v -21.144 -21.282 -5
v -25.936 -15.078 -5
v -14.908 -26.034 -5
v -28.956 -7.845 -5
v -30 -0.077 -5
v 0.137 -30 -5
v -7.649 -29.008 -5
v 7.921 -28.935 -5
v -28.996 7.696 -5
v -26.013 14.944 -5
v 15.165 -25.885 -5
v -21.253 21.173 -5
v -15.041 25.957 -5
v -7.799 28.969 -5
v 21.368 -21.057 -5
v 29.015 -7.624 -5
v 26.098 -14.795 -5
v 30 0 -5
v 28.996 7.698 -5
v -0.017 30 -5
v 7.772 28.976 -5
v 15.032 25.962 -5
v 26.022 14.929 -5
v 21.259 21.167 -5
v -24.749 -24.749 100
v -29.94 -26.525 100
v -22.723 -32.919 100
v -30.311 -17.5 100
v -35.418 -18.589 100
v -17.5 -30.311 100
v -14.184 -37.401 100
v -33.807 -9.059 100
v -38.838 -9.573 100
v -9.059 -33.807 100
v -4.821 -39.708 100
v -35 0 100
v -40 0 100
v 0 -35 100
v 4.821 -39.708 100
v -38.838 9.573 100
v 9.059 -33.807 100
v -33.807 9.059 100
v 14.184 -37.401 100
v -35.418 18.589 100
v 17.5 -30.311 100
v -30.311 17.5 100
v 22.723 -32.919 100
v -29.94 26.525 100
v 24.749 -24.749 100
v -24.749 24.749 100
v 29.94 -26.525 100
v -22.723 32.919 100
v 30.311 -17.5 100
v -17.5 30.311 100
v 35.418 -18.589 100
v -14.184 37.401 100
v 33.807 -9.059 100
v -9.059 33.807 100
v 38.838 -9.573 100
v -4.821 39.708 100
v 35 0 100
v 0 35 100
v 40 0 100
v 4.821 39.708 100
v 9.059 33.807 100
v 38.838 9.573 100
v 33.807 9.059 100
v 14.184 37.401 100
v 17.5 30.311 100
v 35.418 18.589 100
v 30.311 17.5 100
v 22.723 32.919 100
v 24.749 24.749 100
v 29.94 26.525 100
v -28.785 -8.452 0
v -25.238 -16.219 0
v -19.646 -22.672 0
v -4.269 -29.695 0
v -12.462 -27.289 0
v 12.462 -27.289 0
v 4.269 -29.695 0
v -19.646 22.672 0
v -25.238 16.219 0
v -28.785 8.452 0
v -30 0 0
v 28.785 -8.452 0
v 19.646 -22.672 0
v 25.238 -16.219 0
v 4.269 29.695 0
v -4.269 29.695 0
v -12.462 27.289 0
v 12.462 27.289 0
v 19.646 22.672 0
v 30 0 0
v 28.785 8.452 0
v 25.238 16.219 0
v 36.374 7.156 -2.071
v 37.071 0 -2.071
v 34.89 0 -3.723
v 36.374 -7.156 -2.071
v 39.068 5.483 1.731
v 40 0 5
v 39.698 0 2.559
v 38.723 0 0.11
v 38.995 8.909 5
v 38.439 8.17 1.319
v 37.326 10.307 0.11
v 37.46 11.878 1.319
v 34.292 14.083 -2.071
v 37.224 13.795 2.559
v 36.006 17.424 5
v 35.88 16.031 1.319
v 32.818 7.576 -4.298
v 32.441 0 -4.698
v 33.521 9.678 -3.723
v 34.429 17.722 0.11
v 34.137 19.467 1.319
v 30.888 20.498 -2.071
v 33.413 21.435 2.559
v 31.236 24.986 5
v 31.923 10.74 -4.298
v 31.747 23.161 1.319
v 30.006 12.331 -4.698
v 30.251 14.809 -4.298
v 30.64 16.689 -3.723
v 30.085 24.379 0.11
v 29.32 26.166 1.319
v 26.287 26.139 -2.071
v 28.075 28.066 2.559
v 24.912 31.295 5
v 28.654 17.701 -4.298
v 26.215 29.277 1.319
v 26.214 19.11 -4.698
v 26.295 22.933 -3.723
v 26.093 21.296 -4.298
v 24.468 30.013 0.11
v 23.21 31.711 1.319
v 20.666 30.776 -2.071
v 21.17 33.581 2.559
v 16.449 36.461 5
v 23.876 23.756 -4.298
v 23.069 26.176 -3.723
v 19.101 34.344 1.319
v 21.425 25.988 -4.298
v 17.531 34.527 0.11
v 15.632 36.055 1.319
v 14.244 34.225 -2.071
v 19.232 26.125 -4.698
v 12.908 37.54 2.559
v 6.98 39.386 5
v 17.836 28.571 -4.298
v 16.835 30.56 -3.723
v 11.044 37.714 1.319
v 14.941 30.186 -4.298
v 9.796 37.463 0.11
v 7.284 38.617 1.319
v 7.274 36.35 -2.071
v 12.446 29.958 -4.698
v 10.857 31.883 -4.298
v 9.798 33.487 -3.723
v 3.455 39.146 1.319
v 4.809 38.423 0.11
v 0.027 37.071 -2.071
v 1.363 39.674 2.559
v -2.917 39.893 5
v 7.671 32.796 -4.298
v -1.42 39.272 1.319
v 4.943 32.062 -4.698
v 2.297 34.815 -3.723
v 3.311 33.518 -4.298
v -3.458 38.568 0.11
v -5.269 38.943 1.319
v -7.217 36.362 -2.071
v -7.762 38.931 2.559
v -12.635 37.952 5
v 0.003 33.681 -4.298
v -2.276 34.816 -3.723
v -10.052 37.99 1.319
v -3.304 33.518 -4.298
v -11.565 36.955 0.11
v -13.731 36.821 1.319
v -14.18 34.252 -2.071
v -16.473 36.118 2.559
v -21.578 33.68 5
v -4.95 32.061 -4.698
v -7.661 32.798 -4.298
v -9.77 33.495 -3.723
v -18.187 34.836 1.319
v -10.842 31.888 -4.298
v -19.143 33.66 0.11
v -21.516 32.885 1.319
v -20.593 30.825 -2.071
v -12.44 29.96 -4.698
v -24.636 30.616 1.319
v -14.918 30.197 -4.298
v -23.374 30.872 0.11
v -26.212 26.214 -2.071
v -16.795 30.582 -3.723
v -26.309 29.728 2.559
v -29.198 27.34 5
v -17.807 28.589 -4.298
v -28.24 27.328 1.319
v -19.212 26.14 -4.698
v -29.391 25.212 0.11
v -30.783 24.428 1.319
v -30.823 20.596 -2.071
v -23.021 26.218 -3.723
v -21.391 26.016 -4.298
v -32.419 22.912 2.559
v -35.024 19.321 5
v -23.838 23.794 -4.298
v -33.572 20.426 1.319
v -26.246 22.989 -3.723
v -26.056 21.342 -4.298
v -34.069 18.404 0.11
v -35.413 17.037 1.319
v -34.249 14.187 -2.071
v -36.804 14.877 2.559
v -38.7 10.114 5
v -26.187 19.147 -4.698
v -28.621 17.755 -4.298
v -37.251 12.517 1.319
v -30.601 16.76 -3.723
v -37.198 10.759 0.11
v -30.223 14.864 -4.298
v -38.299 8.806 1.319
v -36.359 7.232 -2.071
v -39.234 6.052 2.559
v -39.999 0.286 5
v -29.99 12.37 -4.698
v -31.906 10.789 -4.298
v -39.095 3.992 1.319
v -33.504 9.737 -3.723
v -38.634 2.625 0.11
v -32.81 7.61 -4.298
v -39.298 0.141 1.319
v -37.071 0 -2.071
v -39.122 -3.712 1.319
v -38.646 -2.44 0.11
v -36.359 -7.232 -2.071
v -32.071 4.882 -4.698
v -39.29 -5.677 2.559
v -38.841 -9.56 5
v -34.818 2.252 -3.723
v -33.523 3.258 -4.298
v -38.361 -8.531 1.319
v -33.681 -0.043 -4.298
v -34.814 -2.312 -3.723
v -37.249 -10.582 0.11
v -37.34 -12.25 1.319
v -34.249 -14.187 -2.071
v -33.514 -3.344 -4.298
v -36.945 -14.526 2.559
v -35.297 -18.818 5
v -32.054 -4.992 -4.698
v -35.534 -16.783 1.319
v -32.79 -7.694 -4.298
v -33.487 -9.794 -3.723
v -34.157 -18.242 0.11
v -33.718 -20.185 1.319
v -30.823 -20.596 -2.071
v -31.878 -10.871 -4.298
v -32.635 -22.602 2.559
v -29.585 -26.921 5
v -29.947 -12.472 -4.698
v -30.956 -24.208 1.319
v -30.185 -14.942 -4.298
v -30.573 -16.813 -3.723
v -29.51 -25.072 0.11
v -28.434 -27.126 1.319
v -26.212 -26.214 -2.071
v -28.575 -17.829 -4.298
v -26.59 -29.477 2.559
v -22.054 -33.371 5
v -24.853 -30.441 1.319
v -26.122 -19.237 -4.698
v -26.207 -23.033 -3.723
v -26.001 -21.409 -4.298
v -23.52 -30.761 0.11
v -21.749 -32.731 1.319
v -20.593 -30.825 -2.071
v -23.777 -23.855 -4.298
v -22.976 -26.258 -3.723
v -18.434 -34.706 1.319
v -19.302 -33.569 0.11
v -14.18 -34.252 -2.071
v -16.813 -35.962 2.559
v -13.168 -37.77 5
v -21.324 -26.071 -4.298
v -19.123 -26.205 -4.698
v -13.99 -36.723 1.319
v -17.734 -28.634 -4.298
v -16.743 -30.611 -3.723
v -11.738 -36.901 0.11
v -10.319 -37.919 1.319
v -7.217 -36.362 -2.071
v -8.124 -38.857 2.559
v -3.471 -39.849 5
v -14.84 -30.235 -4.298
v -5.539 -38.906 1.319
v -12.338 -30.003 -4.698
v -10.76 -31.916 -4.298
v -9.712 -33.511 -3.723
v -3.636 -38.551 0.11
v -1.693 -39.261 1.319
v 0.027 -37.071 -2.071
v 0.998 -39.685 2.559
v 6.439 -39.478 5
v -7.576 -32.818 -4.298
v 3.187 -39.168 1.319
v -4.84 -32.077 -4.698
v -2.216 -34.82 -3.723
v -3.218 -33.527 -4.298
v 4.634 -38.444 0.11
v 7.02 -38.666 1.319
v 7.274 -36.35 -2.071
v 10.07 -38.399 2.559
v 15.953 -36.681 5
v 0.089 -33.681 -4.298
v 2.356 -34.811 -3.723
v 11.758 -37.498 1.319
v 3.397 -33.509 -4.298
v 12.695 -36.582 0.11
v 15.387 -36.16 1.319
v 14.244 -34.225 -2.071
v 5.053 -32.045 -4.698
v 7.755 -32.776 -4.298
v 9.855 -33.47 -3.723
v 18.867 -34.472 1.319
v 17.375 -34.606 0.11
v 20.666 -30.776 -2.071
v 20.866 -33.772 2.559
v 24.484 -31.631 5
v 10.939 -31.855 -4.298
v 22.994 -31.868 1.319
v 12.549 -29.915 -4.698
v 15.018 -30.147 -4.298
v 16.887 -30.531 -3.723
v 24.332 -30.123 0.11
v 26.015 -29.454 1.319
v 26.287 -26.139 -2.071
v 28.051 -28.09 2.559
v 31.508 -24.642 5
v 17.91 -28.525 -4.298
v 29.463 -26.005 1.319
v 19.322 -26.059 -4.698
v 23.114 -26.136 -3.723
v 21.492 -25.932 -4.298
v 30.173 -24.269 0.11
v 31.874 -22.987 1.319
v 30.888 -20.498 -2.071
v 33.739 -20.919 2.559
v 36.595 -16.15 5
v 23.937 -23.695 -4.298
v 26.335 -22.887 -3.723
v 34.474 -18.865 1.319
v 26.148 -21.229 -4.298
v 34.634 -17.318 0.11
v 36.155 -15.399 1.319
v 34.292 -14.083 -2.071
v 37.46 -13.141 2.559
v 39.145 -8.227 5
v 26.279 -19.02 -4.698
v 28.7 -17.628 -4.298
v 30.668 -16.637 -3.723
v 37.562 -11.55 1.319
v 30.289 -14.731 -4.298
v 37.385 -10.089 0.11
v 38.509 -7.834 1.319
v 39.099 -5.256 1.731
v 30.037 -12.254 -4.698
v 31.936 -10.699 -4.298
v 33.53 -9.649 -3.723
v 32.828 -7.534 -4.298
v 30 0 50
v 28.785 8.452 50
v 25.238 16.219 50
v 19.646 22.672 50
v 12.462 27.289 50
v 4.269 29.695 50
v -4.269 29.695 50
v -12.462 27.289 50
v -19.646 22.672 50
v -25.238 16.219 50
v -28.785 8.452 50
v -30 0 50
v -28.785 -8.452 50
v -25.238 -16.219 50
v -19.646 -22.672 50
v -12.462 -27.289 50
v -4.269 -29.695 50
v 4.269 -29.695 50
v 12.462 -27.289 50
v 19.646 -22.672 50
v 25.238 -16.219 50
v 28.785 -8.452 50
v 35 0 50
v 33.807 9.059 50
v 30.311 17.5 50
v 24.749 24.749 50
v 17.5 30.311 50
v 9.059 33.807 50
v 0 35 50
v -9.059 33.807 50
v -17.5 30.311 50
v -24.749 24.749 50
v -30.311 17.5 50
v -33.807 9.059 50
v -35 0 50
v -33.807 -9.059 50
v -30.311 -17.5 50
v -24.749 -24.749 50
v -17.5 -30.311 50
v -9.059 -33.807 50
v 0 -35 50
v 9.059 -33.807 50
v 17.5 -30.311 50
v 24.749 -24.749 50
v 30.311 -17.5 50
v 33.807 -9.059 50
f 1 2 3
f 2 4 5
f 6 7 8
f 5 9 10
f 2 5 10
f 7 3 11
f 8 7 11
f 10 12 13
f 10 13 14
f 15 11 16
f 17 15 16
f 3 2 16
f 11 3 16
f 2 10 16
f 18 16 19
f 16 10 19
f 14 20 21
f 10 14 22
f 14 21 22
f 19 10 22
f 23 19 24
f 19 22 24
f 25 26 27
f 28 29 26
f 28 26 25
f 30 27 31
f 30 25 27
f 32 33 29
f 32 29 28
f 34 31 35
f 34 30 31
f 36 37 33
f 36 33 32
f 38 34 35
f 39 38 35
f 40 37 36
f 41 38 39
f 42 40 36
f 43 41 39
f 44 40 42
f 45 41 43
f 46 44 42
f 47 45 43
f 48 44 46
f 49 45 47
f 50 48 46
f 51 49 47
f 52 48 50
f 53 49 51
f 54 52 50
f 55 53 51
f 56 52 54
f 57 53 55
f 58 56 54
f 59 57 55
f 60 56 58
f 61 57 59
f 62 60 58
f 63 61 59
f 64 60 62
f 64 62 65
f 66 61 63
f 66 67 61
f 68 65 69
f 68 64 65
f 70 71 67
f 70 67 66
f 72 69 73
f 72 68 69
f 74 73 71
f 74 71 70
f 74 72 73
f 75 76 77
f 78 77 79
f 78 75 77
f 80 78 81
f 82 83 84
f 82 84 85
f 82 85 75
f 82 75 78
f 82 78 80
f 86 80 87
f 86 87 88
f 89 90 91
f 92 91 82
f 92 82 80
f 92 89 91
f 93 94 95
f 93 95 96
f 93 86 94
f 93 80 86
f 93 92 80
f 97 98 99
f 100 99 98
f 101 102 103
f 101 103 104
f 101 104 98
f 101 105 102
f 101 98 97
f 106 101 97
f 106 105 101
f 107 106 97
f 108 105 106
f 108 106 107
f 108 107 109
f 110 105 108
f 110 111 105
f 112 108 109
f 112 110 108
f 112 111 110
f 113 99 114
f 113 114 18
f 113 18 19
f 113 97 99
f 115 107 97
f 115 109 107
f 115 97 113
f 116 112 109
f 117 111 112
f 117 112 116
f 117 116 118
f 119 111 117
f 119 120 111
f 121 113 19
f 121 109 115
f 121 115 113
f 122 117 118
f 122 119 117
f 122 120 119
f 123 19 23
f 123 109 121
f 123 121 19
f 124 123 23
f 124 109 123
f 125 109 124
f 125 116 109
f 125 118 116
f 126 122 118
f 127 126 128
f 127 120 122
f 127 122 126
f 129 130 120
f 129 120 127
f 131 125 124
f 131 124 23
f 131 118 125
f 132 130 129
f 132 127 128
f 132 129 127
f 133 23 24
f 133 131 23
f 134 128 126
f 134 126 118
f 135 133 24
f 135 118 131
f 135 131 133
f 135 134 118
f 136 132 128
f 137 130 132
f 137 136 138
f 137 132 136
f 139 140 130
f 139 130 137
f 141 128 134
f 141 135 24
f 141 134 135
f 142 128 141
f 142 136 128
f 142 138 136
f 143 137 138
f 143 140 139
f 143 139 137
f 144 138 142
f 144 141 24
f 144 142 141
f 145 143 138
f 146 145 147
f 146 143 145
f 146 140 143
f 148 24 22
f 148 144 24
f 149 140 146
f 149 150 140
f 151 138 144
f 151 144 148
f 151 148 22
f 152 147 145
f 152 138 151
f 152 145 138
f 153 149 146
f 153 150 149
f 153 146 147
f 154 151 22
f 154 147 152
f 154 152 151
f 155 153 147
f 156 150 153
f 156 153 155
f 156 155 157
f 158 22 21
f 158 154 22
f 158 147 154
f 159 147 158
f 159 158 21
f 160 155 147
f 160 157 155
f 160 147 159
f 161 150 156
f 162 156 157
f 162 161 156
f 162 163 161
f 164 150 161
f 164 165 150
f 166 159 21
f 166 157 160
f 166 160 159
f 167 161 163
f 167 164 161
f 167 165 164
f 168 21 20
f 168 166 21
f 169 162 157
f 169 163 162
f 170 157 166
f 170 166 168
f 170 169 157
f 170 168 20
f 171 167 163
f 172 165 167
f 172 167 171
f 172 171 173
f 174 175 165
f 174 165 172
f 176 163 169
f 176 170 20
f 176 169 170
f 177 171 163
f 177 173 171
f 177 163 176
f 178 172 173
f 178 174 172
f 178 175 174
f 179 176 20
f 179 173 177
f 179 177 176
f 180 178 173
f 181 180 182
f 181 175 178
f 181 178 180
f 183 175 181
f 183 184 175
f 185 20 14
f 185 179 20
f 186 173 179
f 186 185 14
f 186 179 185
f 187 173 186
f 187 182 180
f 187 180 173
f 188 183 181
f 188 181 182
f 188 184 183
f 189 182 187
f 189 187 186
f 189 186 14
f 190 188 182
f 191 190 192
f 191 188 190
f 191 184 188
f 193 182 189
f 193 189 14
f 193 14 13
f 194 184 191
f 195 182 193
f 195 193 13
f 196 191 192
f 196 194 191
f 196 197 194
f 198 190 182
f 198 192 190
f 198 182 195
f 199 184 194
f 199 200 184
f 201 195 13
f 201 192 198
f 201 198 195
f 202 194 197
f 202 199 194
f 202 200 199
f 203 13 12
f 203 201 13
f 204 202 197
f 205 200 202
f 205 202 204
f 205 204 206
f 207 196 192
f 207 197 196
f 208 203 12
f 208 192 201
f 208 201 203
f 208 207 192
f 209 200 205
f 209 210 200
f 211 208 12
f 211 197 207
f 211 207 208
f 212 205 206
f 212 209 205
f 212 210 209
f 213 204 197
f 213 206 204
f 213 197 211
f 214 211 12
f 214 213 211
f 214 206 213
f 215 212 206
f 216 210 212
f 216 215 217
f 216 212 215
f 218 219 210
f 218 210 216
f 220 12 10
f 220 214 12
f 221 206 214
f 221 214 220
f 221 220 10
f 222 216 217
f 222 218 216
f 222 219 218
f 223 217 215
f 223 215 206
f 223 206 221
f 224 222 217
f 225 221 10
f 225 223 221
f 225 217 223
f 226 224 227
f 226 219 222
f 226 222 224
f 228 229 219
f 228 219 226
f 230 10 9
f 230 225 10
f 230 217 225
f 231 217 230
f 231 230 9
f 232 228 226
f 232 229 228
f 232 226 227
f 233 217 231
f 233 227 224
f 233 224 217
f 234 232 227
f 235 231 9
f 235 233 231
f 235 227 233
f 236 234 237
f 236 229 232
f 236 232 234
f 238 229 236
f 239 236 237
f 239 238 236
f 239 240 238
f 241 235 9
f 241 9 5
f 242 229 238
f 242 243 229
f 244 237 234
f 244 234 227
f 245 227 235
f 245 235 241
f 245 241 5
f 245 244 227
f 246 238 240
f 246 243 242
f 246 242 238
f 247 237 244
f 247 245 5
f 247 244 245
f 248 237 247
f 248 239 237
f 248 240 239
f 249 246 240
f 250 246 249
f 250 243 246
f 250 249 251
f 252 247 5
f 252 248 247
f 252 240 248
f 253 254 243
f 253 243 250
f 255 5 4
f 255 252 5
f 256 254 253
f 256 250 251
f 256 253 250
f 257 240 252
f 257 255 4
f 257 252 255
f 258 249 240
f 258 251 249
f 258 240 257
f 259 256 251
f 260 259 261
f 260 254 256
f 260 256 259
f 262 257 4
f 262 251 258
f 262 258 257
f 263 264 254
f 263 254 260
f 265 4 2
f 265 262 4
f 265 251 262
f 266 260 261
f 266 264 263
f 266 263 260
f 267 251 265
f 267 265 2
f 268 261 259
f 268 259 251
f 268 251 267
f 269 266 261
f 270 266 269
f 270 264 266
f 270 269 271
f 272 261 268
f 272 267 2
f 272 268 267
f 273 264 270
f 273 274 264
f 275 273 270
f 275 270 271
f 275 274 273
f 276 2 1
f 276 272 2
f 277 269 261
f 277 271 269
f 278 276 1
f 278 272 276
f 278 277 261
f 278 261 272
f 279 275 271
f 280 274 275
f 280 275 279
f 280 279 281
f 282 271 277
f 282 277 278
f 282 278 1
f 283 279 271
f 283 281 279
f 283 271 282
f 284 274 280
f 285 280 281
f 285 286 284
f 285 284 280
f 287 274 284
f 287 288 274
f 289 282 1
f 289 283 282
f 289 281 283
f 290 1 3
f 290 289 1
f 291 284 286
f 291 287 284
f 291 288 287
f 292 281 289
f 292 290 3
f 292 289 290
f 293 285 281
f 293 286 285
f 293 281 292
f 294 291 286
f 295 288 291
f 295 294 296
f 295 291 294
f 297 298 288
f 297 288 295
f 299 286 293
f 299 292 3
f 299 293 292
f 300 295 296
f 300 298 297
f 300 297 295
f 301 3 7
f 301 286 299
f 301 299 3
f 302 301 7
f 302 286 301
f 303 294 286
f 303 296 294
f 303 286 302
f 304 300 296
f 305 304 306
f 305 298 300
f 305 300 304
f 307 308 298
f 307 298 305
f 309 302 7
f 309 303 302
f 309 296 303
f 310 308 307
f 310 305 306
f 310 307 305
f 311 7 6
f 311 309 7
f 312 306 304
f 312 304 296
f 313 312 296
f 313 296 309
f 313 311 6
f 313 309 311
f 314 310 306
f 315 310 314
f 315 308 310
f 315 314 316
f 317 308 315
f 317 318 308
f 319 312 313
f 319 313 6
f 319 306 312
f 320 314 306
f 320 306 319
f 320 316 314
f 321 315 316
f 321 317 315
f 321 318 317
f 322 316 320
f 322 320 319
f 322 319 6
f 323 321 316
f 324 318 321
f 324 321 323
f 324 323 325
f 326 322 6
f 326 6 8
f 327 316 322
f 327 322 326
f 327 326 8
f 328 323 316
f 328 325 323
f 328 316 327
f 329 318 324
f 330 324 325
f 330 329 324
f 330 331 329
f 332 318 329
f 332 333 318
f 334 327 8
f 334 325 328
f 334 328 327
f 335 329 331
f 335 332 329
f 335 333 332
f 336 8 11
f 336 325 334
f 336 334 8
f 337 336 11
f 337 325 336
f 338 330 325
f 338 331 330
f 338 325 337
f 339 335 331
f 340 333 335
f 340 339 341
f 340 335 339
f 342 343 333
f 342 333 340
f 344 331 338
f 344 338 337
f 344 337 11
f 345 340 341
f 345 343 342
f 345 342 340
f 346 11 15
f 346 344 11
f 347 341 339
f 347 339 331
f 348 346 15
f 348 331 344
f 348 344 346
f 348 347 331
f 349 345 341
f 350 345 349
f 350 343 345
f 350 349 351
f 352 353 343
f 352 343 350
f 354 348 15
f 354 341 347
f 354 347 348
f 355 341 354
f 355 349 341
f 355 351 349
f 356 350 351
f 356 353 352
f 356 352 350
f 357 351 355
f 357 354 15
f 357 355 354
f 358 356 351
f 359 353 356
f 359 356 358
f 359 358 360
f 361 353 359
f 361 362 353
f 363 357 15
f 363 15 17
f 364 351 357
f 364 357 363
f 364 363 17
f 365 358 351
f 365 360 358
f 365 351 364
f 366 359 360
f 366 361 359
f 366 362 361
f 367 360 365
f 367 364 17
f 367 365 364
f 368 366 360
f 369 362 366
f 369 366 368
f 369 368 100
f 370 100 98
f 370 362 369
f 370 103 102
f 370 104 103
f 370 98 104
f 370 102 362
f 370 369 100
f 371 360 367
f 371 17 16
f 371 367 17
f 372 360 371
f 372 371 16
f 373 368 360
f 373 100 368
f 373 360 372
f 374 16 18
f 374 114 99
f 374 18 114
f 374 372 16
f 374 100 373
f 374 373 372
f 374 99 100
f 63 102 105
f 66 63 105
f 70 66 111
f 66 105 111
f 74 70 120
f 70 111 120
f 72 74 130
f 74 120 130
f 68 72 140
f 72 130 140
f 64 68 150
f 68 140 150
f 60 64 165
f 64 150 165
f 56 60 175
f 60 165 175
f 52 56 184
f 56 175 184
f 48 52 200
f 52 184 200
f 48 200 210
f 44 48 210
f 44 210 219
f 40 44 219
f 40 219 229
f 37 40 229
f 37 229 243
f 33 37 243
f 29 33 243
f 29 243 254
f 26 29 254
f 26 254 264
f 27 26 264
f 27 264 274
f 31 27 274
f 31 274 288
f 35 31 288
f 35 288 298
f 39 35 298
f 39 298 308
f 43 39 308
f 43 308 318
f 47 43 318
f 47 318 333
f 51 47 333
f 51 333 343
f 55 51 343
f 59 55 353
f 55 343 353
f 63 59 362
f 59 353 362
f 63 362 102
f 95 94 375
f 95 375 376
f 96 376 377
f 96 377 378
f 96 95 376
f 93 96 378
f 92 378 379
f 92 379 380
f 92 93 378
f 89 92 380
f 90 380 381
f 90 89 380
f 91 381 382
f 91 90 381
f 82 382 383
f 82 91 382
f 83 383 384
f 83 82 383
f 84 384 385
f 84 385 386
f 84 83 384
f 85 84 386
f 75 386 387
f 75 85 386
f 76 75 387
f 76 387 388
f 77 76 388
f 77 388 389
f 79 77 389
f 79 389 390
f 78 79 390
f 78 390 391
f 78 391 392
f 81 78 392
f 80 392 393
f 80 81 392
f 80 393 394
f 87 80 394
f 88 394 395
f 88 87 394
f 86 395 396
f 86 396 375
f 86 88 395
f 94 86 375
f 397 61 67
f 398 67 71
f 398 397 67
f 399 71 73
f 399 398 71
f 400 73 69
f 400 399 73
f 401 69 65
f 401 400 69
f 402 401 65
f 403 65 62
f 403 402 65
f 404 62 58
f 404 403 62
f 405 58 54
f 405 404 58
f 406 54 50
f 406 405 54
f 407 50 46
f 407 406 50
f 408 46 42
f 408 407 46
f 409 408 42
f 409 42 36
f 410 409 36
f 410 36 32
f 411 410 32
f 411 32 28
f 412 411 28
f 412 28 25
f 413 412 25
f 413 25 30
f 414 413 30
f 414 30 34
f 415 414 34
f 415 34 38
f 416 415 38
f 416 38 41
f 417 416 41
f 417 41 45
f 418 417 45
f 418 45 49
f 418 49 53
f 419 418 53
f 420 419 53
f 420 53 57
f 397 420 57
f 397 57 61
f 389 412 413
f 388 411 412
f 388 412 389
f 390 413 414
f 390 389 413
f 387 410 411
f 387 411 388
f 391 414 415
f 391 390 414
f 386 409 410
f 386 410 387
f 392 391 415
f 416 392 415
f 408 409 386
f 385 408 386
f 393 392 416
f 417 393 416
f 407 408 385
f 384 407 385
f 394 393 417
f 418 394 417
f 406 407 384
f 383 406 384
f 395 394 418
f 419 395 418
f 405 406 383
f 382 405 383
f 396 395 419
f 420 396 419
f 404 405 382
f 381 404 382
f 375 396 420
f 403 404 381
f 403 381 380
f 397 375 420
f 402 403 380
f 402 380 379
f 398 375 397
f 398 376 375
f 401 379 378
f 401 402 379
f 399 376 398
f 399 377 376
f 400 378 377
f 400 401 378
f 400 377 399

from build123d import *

# Parameters (mm, degrees)
F0_R     = 40
F0_R_2   = 35
F0_R_3   = 30
F1_DEPTH = 50
F2_DEPTH = 100
F3_DEPTH = 5
F4_R     = 10


with BuildPart() as f1:
    # F0 (on Top) → F1 (new body)
    with BuildSketch(Plane.XY):
        Circle(F0_R)
        Circle(F0_R_2, mode=Mode.SUBTRACT)
        Circle(F0_R_2)
        Circle(F0_R_3, mode=Mode.SUBTRACT)
    extrude(amount=F1_DEPTH)

    # F0 (on Top) → F2 (join)
    with BuildSketch(Plane.XY):
        Circle(F0_R)
        Circle(F0_R_2, mode=Mode.SUBTRACT)
    extrude(amount=F2_DEPTH)

    # F0 (on Top) → F3 (join)
    with BuildSketch(Plane.XY):
        Circle(F0_R)
        Circle(F0_R_2, mode=Mode.SUBTRACT)
        Circle(F0_R_2)
        Circle(F0_R_3, mode=Mode.SUBTRACT)
        Circle(F0_R_3)
    extrude(amount=-F3_DEPTH)

    # F4
    f4_edges = [f1.edges().sort_by_distance(p)[0] for p in [
        (-40, 0, -5),
    ]]
    fillet(f4_edges, radius=F4_R)


solid = f1.part
